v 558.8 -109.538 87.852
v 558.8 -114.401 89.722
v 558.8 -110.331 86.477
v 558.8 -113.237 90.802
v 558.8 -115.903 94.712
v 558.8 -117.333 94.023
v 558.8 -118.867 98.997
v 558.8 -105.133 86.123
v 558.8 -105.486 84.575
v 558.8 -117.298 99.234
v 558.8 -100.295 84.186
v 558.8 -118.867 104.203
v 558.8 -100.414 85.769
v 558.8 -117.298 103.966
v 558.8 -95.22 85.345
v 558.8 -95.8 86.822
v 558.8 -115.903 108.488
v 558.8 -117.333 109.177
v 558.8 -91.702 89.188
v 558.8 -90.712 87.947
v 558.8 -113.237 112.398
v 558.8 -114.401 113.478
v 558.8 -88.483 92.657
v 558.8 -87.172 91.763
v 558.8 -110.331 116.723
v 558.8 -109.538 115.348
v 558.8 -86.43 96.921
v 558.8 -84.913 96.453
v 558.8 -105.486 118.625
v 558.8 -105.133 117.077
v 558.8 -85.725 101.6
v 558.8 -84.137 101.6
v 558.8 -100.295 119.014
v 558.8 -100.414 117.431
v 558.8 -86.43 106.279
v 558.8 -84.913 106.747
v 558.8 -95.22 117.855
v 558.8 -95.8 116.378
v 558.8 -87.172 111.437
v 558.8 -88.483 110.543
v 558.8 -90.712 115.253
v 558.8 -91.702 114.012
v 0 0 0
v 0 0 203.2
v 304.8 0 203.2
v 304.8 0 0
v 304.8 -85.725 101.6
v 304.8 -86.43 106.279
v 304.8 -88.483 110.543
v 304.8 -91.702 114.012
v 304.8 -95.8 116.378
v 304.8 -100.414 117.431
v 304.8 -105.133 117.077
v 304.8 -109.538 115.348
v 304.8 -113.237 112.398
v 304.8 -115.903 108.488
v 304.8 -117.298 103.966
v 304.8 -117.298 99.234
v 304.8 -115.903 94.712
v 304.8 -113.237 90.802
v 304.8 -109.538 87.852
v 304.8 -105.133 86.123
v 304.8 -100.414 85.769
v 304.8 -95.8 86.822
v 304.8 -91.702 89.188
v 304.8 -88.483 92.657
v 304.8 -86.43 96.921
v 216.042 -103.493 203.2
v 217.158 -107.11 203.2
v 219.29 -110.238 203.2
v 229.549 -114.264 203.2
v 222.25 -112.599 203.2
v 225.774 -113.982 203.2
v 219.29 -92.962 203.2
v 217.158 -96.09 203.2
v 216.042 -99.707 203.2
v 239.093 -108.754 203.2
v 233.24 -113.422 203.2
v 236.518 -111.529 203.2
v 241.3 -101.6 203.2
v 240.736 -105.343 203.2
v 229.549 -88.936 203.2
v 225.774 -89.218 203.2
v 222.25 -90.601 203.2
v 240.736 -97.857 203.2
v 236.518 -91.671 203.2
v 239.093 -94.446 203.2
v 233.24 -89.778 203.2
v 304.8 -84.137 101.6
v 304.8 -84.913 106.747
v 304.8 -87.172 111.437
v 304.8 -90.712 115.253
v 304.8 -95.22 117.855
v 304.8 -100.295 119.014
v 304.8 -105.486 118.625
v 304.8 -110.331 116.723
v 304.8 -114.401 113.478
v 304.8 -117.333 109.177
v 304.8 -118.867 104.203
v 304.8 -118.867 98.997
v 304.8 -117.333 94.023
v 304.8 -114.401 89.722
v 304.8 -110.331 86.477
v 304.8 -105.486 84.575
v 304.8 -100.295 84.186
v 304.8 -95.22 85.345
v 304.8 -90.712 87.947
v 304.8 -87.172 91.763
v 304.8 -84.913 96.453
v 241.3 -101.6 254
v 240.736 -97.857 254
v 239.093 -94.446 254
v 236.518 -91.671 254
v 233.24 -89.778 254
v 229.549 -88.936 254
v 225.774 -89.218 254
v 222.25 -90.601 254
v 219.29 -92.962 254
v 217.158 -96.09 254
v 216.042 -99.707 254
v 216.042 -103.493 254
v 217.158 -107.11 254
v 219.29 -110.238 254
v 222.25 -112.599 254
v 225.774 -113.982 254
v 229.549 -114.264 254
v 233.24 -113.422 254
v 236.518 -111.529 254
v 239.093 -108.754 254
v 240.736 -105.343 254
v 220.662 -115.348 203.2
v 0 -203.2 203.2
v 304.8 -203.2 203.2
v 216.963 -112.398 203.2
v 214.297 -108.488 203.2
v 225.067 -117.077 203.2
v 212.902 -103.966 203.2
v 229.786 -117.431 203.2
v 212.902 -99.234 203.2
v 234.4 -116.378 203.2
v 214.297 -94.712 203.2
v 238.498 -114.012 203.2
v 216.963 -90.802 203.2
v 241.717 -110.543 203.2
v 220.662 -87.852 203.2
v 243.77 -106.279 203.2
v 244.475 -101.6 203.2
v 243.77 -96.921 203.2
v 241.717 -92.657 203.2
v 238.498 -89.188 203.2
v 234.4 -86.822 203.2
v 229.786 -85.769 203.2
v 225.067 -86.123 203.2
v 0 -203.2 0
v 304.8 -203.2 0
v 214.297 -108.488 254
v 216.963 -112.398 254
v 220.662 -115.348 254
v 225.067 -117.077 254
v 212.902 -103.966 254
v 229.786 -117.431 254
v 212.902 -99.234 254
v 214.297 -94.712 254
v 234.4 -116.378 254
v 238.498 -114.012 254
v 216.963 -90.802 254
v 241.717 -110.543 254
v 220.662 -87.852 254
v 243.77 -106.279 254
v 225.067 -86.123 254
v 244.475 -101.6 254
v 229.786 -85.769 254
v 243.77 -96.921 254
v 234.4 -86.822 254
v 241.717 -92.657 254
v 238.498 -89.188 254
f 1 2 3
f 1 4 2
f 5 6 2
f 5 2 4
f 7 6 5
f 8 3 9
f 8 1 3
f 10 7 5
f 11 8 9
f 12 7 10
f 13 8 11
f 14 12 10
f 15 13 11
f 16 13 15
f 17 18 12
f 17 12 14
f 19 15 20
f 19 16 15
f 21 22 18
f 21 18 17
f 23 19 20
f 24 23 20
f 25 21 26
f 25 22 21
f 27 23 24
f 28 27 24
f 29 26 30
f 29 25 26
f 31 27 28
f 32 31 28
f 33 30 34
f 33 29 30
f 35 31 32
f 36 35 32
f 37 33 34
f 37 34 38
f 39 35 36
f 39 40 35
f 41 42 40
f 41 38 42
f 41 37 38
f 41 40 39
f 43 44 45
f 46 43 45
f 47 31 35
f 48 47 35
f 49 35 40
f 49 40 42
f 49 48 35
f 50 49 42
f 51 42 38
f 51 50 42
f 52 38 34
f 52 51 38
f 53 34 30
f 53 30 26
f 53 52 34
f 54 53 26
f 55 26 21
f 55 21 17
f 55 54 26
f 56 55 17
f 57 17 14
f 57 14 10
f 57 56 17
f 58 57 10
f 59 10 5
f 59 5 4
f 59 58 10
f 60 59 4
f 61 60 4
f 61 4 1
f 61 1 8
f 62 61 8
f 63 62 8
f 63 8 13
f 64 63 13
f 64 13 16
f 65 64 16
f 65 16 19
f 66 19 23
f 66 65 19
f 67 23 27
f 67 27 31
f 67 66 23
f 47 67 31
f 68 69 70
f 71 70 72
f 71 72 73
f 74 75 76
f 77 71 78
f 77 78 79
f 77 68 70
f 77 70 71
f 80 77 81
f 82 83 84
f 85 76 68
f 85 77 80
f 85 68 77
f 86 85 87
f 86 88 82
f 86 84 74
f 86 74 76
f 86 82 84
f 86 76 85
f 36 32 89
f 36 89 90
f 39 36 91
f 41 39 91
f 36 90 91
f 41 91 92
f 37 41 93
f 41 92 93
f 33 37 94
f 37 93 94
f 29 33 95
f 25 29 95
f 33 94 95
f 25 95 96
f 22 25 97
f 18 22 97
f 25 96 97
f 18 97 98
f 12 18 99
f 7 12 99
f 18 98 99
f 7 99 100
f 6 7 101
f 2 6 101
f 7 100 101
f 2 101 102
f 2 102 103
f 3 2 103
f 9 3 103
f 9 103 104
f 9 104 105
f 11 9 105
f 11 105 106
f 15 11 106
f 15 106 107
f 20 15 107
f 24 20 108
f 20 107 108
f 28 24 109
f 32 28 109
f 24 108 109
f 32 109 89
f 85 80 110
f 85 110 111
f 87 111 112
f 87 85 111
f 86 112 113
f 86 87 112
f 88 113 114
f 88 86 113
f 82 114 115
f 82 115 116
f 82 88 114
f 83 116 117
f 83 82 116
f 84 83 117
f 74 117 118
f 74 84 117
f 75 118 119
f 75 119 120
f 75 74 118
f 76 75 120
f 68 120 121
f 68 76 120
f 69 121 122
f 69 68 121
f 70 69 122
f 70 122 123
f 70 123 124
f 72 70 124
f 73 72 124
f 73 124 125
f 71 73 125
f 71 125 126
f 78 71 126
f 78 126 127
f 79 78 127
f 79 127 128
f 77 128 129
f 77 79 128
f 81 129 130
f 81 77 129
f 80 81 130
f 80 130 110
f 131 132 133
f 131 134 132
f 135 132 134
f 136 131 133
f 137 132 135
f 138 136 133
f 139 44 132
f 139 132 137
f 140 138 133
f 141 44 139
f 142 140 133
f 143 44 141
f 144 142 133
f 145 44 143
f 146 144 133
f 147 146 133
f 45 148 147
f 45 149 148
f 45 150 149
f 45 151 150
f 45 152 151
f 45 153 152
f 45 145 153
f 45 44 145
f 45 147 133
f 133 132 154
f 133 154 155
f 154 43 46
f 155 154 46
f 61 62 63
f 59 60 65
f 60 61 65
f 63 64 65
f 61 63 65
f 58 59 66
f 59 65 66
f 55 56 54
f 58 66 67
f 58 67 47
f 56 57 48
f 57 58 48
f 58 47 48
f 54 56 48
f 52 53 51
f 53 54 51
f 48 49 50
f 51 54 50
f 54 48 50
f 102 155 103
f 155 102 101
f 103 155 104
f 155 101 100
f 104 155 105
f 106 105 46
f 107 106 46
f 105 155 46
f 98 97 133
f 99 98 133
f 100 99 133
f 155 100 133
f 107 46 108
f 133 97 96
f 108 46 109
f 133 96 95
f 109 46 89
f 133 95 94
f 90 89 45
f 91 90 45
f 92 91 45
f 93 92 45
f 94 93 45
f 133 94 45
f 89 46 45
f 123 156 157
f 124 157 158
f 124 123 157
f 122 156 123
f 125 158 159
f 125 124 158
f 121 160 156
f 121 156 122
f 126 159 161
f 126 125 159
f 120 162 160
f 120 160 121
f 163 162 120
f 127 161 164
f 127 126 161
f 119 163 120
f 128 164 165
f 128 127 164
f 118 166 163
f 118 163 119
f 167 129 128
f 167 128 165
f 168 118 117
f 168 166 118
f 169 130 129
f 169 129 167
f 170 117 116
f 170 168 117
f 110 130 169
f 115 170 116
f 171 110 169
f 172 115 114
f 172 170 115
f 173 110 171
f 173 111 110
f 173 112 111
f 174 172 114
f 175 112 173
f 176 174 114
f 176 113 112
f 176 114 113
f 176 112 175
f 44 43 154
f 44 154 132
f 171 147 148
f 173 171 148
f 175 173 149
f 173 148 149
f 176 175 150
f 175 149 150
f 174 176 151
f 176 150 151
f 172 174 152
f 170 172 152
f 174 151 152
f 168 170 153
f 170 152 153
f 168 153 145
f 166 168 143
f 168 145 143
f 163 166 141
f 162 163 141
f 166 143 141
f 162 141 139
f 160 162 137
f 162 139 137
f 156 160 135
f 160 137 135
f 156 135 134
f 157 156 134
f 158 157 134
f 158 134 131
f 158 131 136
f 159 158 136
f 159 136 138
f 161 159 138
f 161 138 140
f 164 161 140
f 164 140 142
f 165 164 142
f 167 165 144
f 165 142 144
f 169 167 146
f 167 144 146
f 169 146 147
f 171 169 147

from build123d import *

# Parameters (mm, degrees)
F0_W     = 304.8
F0_H     = 203.2
F1_DEPTH = 203.2
F2_R     = 17.4625
F2_R_2   = 15.875
F3_DEPTH = 254
F4_R     = 15.875
F4_R_2   = 12.7
F5_DEPTH = 50.8


with BuildPart() as f1:
    # F0 (on Front) → F1 (new body)
    with BuildSketch(Plane.XZ):
        with Locations((152.4, 101.6)):
            Rectangle(F0_W, F0_H)
    extrude(amount=F1_DEPTH)

    # F2 (on face) → F3 (join)
    with BuildSketch(Plane.YZ.offset(304.8)):
        with Locations((-101.6, 101.6)):
            Circle(F2_R)
        with Locations((-101.6, 101.6)):
            Circle(F2_R_2, mode=Mode.SUBTRACT)
    extrude(amount=F3_DEPTH)

    # F4 (on face) → F5 (join)
    with BuildSketch(Plane.XY.offset(203.2)):
        with Locations((228.6, -101.6)):
            Circle(F4_R)
        with Locations((228.6, -101.6)):
            Circle(F4_R_2, mode=Mode.SUBTRACT)
    extrude(amount=F5_DEPTH)


solid = f1.part
